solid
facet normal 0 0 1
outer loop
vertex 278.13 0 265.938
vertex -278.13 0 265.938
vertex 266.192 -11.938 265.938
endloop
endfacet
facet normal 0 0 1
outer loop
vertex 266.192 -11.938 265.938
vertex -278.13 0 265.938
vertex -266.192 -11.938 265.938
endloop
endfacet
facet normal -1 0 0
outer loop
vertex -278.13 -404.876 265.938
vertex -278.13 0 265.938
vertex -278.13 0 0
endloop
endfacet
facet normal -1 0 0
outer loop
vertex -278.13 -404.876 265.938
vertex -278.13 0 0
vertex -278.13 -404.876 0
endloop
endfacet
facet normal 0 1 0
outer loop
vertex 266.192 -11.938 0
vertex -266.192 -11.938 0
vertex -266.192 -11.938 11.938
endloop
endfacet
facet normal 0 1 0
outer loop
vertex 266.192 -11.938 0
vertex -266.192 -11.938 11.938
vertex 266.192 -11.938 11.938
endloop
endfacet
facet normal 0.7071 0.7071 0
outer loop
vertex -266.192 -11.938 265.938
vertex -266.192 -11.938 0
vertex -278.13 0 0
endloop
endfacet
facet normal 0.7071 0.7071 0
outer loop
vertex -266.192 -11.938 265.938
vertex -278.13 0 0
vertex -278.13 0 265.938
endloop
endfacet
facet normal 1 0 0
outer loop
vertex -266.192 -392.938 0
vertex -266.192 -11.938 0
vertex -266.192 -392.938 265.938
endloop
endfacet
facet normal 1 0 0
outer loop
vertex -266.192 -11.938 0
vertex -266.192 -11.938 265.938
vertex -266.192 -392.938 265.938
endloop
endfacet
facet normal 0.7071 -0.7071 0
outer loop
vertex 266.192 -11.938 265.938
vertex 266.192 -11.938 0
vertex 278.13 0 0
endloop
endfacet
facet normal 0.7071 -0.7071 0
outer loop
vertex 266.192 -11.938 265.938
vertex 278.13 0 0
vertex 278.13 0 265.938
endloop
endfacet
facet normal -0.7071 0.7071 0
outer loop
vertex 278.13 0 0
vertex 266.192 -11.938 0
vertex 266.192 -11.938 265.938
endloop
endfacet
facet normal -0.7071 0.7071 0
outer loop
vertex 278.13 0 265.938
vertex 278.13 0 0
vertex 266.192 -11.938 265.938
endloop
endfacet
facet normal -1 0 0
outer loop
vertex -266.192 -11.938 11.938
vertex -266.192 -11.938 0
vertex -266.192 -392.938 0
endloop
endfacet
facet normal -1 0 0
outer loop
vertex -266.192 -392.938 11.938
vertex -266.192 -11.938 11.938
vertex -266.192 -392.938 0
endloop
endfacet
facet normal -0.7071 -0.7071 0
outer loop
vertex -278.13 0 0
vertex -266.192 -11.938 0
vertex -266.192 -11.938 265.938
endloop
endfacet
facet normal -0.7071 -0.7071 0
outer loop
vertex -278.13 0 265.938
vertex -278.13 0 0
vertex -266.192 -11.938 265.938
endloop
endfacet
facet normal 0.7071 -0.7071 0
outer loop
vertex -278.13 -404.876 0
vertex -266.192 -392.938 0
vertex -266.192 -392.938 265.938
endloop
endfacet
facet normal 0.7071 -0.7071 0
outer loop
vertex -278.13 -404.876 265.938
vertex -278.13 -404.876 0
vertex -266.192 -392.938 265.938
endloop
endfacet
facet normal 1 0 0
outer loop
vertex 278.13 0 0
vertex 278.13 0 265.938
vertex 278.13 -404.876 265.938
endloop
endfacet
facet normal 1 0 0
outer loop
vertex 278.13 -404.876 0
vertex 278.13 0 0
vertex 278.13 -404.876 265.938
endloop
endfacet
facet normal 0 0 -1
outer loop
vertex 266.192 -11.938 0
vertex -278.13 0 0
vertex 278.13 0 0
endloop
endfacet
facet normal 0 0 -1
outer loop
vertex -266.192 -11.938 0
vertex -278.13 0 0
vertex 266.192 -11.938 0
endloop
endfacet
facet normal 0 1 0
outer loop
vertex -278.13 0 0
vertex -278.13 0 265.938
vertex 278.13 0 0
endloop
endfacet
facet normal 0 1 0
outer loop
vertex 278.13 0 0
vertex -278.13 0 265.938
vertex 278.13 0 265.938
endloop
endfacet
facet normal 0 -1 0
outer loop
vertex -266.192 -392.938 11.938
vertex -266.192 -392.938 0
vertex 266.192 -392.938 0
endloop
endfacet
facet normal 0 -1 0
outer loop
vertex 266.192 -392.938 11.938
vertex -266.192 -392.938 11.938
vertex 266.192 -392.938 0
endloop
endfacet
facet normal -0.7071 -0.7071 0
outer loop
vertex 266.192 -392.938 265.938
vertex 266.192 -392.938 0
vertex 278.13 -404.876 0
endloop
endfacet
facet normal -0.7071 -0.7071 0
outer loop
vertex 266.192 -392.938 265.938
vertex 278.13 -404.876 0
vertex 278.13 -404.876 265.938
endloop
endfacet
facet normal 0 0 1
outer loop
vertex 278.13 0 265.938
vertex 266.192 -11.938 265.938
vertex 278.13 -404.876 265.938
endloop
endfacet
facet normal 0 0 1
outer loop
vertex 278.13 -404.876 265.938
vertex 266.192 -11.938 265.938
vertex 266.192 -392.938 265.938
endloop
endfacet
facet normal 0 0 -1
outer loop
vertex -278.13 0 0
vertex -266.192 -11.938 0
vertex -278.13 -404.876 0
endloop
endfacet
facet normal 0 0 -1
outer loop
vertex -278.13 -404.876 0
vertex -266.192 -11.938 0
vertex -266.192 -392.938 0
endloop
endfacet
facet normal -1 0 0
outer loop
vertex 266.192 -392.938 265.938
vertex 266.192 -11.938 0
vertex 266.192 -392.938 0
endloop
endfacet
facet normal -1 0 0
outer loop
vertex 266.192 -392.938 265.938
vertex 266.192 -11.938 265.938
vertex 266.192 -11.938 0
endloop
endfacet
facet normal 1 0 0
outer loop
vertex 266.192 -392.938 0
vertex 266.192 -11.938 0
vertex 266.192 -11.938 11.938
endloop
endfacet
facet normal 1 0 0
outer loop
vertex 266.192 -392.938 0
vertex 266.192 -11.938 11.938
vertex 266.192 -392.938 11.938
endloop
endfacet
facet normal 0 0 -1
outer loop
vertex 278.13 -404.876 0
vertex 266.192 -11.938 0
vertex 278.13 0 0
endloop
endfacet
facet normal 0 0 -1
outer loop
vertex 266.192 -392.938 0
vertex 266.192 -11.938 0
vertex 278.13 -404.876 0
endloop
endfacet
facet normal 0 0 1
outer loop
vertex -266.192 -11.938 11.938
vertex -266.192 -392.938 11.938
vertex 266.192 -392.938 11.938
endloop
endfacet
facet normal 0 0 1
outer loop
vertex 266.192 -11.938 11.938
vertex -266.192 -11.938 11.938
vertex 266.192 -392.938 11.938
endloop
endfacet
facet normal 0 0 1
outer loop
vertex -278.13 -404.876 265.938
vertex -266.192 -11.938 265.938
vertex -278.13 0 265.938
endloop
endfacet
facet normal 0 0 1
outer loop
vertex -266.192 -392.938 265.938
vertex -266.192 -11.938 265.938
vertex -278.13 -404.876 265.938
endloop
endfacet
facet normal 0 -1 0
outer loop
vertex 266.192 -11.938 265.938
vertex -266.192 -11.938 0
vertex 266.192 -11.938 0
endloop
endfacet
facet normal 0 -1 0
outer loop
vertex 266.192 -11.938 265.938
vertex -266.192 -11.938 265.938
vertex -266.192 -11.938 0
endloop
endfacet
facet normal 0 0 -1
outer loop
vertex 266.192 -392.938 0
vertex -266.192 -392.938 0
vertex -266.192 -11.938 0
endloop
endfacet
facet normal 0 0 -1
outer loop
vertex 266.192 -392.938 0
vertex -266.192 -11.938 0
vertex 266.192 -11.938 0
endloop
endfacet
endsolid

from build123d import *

# Parameters (mm, degrees)
F1_W      = 556.26
F1_H      = 265.938
F2_DEPTH  = 11.938
F3_W      = 532.384
F3_H      = 381
F4_DEPTH  = 11.938
F5_W      = 404.876
F5_H      = 265.938
F6_DEPTH  = 11.938
F8_SIZE   = 11.93799
F8_2_SIZE = 11.93799
F8_3_SIZE = 11.93799


# Not quite as in the source:
# - a variable given as a bare number and used for a length is read in inches; the dataset says mm whatever the document's units were
# - a fillet or chamfer is up to 0.001 mm smaller than in the source, because OpenCascade refuses the exact size


with BuildPart() as f2:
    # F1 (on Front) → F2 (new body)
    with BuildSketch(Plane.XZ):
        with Locations((0, 132.969)):
            Rectangle(F1_W, F1_H)
    extrude(amount=F2_DEPTH)

    # F8 (size 11.938 in the source; OpenCascade refuses exactly that, so slightly less here)
    f8_edges = [f2.edges().sort_by_distance(p)[0] for p in [
        (278.13, -11.938, 132.969),
        (-278.13, -11.938, 132.969),
    ]]
    chamfer(f8_edges, length=F8_SIZE)


with BuildPart() as f4:
    # F3 (on face) → F4 (new body)
    with BuildSketch(Plane(origin=(0, 0, 0), x_dir=(1, 0, 0), z_dir=(0, 0, -1))):
        with Locations((0, 202.438)):
            Rectangle(F3_W, F3_H)
    extrude(amount=-F4_DEPTH)


with BuildPart() as f6:
    # F5 (on face) → F6 (new body)
    with BuildSketch(Plane(origin=(-266.192, 0, 0), x_dir=(0, -1, 0), z_dir=(-1, 0, 0))):
        with Locations((202.438, 132.969)):
            Rectangle(F5_W, F5_H)
    extrude(amount=F6_DEPTH)


with BuildPart() as f7_1:
    # F7: instance of F6
    add(f6.part.mirror(Plane.YZ))

    # F8#2 (size 11.938 in the source; OpenCascade refuses exactly that, so slightly less here)
    f8_2_edges = [f7_1.edges().sort_by_distance(p)[0] for p in [
        (266.192, 0, 132.969),
        (266.192, -404.876, 132.969),
    ]]
    chamfer(f8_2_edges, length=F8_2_SIZE)


with BuildPart() as f6_1:
    add(f6.part)

    # F8#3 (size 11.938 in the source; OpenCascade refuses exactly that, so slightly less here)
    f8_3_edges = [f6_1.edges().sort_by_distance(p)[0] for p in [
        (-266.192, 0, 132.969),
        (-266.192, -404.876, 132.969),
    ]]
    chamfer(f8_3_edges, length=F8_3_SIZE)


solid = Compound([f2.part, f4.part, f7_1.part, f6_1.part])
